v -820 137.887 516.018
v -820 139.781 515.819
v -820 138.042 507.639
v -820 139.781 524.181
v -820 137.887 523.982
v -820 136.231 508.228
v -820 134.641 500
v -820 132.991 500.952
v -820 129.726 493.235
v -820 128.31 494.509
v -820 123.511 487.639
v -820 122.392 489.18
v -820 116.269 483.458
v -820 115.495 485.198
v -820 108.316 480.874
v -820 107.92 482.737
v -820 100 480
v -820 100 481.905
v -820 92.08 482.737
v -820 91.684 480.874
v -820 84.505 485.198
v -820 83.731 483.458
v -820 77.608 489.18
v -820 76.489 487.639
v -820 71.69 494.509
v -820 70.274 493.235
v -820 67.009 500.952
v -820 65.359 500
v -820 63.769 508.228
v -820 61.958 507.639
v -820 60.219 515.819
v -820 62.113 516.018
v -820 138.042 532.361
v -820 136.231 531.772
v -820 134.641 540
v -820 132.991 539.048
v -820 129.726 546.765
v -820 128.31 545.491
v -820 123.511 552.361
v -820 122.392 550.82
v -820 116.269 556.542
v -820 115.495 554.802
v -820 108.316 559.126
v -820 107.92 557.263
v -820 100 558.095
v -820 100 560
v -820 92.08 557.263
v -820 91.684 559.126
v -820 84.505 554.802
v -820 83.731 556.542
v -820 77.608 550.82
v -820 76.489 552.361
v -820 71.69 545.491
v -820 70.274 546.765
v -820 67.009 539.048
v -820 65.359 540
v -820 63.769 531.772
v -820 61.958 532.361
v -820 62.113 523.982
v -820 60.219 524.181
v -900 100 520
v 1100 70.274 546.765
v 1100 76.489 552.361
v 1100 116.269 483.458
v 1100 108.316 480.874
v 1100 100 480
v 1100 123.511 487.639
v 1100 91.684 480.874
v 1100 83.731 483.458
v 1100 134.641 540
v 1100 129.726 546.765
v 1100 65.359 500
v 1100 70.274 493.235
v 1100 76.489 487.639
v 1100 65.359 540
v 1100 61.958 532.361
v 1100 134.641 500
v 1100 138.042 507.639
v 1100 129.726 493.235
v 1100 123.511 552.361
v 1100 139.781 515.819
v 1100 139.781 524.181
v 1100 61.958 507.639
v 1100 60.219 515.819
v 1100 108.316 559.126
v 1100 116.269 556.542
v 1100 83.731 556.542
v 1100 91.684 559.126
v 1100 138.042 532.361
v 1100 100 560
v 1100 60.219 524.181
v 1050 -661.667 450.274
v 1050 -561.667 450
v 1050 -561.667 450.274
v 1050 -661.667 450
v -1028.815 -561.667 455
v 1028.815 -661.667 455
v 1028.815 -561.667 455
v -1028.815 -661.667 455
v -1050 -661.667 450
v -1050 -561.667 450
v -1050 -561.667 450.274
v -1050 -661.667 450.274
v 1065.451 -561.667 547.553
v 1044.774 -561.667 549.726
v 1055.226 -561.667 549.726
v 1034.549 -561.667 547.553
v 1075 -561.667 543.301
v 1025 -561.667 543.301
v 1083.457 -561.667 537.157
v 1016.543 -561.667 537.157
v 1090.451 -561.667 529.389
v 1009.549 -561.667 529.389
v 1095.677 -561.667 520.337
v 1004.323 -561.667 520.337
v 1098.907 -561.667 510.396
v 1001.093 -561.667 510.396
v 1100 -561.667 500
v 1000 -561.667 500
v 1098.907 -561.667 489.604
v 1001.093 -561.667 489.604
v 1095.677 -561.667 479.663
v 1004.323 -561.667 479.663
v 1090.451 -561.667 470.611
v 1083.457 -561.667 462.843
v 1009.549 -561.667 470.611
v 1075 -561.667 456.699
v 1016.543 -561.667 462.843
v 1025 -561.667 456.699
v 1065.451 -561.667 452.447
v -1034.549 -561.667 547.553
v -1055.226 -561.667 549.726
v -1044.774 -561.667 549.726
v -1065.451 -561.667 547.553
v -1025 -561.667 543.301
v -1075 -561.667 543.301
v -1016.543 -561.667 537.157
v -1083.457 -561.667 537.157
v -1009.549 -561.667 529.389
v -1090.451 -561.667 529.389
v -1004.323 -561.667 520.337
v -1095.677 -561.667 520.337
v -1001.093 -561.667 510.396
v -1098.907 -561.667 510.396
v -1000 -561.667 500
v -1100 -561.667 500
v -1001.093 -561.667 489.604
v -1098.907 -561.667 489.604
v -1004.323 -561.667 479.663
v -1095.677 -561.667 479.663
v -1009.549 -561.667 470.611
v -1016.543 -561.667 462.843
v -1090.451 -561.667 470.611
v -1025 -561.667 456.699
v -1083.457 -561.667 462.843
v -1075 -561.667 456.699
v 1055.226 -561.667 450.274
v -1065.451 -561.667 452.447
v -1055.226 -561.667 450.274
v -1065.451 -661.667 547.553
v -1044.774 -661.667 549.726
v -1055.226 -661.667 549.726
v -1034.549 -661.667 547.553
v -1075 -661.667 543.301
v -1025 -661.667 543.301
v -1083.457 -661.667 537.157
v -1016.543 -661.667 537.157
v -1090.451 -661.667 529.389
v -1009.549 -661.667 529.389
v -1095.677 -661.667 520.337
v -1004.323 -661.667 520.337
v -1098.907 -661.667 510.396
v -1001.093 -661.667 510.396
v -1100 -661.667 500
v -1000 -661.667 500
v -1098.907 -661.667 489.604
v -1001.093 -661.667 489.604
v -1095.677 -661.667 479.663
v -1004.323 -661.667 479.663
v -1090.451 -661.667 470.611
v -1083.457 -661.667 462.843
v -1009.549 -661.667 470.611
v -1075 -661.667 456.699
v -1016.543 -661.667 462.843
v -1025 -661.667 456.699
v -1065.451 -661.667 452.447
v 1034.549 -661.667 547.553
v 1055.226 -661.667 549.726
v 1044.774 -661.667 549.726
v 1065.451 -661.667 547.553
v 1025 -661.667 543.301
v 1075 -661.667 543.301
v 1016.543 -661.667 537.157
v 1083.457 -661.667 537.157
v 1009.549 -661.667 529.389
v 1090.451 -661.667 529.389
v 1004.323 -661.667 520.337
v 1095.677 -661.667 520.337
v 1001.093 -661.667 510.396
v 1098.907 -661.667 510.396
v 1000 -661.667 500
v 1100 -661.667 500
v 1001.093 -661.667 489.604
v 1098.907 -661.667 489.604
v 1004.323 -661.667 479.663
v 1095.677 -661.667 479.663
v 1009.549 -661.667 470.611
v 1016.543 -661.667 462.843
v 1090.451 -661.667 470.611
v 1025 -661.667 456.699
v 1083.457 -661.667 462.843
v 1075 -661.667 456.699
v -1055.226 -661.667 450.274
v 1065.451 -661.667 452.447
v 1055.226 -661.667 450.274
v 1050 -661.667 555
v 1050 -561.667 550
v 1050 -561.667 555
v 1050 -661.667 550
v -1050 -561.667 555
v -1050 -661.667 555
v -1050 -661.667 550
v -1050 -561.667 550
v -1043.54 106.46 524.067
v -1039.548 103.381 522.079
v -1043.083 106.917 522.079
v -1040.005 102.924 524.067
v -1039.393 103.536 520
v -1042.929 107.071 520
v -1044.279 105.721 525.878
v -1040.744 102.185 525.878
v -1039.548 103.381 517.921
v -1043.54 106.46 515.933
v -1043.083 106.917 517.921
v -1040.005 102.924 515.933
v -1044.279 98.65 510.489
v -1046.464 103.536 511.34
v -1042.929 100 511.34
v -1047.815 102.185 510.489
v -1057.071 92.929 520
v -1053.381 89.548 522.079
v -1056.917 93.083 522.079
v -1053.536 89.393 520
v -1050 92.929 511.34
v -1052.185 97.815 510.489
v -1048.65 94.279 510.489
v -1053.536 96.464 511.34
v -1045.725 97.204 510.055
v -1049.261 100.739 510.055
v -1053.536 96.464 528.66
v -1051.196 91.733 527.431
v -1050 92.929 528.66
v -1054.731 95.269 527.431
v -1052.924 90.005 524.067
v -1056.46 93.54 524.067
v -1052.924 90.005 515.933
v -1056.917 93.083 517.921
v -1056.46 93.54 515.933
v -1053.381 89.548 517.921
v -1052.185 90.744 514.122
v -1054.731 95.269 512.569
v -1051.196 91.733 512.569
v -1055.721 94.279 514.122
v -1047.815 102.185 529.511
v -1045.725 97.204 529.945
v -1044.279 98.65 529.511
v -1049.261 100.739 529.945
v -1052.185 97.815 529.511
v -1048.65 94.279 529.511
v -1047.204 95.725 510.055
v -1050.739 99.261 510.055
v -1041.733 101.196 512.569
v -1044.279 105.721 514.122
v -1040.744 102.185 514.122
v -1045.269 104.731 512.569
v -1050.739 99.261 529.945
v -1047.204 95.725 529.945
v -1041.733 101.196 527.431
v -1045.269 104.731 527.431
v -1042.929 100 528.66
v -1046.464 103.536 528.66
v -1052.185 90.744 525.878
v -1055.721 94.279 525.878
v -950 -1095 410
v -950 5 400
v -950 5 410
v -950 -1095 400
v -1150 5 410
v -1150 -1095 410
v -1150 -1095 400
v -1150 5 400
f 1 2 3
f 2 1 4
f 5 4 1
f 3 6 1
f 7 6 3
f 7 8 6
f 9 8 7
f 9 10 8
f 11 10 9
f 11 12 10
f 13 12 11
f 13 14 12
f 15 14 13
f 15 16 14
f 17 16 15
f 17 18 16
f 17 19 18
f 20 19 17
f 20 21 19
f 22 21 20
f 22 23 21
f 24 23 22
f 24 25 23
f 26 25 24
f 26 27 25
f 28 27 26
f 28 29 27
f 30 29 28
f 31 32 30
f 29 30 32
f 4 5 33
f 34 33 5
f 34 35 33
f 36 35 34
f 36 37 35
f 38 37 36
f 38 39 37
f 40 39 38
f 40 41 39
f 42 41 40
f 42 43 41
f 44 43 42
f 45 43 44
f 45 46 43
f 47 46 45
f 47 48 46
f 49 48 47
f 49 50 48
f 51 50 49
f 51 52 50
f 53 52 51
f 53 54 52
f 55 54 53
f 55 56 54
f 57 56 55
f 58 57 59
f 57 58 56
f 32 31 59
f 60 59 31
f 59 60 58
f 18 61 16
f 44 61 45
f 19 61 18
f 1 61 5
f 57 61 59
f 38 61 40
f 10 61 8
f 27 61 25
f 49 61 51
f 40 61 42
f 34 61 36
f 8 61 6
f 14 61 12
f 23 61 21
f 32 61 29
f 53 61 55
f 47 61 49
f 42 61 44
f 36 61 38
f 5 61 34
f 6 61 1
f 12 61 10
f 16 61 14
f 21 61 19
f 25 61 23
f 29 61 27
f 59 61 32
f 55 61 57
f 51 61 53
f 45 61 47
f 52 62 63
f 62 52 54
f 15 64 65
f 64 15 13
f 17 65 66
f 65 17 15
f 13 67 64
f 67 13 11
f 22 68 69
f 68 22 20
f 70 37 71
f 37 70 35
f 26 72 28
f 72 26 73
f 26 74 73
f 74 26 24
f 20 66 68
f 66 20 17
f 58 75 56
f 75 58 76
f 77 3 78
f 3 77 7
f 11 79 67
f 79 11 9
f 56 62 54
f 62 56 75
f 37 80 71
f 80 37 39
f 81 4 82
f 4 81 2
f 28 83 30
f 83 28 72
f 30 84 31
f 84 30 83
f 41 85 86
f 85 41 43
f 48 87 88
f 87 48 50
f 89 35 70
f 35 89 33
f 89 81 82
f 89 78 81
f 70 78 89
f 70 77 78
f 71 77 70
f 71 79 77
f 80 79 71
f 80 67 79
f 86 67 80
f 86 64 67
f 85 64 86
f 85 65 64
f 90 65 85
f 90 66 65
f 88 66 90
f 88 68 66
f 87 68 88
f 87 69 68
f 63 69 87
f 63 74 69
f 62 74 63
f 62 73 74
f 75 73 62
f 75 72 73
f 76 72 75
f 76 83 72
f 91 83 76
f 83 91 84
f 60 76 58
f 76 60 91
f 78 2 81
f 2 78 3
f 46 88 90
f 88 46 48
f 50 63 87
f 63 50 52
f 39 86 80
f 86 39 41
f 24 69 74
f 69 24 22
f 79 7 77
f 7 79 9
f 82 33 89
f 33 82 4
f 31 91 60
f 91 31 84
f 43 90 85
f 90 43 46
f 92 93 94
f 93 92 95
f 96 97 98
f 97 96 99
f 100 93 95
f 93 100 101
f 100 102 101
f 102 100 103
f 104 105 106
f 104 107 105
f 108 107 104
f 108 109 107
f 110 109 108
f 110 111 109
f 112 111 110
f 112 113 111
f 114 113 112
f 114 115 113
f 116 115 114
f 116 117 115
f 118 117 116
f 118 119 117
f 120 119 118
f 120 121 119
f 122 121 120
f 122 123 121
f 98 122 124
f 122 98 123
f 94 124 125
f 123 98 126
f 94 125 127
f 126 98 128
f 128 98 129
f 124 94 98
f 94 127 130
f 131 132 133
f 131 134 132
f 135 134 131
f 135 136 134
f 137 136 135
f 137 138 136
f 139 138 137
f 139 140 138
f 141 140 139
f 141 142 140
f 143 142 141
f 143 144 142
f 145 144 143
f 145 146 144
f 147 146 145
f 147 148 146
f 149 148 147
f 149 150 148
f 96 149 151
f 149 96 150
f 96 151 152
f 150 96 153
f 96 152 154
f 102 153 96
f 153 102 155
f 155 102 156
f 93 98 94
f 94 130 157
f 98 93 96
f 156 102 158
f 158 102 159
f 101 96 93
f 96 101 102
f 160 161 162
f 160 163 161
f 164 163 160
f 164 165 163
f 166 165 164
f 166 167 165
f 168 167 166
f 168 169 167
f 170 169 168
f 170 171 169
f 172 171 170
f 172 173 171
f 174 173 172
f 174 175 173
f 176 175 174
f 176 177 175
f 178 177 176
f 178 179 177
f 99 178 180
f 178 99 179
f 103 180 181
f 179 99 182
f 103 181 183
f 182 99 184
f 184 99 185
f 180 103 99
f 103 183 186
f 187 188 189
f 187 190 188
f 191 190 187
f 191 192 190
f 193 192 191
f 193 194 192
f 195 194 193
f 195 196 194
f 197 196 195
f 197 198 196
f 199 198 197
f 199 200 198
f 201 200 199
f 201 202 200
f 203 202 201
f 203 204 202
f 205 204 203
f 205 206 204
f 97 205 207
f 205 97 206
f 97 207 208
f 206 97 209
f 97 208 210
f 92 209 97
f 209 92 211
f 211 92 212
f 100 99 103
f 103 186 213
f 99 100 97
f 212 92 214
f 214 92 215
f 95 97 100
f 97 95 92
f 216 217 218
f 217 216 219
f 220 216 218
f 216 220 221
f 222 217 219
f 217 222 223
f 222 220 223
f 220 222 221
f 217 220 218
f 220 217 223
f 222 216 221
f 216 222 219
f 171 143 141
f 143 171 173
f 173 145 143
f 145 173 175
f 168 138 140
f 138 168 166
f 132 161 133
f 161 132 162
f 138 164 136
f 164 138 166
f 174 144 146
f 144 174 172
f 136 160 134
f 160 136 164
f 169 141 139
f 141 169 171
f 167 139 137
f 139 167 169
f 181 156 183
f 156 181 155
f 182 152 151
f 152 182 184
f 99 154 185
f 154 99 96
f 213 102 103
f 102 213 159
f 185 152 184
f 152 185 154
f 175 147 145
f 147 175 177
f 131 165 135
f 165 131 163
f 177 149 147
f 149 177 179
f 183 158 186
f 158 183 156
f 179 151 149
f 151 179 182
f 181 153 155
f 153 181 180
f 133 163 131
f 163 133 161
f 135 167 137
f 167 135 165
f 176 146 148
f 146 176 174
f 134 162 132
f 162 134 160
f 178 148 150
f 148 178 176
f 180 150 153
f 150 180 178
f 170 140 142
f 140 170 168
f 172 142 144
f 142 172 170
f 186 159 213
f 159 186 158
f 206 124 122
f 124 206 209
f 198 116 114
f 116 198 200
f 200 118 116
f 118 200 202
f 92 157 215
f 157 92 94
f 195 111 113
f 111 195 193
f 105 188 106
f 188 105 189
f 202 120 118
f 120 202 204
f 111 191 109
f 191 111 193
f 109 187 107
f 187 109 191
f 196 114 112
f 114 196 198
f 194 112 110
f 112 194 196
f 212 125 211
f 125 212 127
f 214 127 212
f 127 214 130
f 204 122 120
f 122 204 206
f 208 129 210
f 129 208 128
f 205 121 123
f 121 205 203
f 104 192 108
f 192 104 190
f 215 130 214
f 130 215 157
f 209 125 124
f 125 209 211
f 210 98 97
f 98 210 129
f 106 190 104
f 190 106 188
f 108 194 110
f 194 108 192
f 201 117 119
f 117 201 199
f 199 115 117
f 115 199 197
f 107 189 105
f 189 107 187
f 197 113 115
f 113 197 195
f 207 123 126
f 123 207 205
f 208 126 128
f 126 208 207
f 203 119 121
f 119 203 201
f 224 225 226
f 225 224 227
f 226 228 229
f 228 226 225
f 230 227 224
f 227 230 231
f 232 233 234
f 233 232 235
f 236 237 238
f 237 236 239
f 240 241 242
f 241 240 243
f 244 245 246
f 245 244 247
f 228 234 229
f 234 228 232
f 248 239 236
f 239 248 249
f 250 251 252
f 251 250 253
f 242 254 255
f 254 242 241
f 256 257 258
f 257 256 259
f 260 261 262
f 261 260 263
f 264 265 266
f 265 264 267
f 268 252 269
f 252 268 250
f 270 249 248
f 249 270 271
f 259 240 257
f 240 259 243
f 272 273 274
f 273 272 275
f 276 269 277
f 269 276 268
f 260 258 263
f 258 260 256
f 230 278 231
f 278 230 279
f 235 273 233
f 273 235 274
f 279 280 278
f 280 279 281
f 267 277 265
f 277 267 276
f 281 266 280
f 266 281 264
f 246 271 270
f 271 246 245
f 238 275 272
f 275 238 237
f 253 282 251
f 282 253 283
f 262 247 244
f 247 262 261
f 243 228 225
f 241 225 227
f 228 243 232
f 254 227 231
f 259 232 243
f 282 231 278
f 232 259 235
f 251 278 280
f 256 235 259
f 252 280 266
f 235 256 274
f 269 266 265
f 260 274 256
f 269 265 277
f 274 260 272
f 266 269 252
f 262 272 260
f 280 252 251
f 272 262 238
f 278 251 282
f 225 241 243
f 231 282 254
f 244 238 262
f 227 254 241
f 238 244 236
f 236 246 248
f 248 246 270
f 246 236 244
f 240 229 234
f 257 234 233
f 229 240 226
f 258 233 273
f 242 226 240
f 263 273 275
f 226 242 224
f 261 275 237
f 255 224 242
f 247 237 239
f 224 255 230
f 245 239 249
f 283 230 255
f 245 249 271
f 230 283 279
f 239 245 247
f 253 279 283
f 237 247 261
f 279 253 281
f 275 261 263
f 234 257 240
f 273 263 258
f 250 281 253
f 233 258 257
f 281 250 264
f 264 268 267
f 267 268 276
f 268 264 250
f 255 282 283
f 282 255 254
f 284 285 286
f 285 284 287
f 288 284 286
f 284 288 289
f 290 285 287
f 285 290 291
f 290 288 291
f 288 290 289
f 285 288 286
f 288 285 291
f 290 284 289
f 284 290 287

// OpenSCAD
chassis_height = 600;
chassis_length = 1300;
chassis_width = 2300;

// The laser tube.
// TODO: How will it be attached?
translate([-900, 100, chassis_height - 80])
	rotate([0, 90, 0]) color(0.8, 0.8, 0.8, 1.0) {
		difference() {
			cylinder(h=2000, r=40);

			difference() {
				translate([0, 0, -1]) cylinder(h=81, r=42);
				cylinder(h=84, r1=0, r2=40);
			}
		}
	}

// Backside mirror.
translate([-chassis_width/2+100, 100, chassis_height-80])
	rotate([90, 0, 45])
		cylinder(h=5, r=10);

// Left chassis motor for moving the laser forward and backward.
// TODO: Add this.


// Rubber band for making the engine go left/right.
translate([-chassis_width/2+100, -2*chassis_length/3+205, chassis_height-150]) {
	union() {
		cube([chassis_width-200, 100, 5]);
		translate([0, 0, 100]) cube([chassis_width-200, 100, 5]);
		translate([0, 100, 50])
			rotate([90, 0, 0])
				cylinder(h=100, r=50);
		translate([chassis_width-200, 100, 50])
			rotate([90, 0, 0])
				cylinder(h=100, r=50);
	}

	
}

// The chassis itself.
union() {
	// Separating wall between laser and main chassis.
	color([1, 1, 1, 0.5]) difference() {
		translate([-chassis_width/2, 0, 0])
			%cube([chassis_width, 10, chassis_height]);
		translate([-chassis_width/2, -2, chassis_height-200])
			%cube([201, 14, 201]);
	}

	// Bottom plate.
	color([1, 1, 1, 0.5]) translate([-chassis_width/2, -chassis_length + 200, 0])
		%cube([chassis_width, chassis_length, 10]);

	// Back plane.
	color([1, 1, 1, 0.5]) translate([-chassis_width/2, 200, 0])
		%cube([chassis_width, 10, chassis_height]);

	// Top plate.
   color([1, 1, 1, 0.3])
		translate([-chassis_width/2, -chassis_length+205, chassis_height])
			%cube([chassis_width, chassis_length + 10, 10]);

	// Left plate.
	color([1, 1, 1, 0.3]) translate([-chassis_width/2, -chassis_length+205, 0])
		%cube([10, chassis_length+10, chassis_height]);

	// Right plate.
	color([1, 1, 1, 0.3]) translate([chassis_width/2, -chassis_length+205, 0])
		%cube([10, chassis_length+10, chassis_height]);

	// Front plate.
	color([1, 1, 1, 0.3]) translate([-chassis_width/2, -chassis_length+205, 0])
		%cube([chassis_width, 10, chassis_height]);

	// Mirror holding layer on the left.
	color([1, 1, 1, 0.5])
		translate([-chassis_width/2, -chassis_length+205, chassis_height-200])
			cube([200, chassis_length-200, 10]);
}
